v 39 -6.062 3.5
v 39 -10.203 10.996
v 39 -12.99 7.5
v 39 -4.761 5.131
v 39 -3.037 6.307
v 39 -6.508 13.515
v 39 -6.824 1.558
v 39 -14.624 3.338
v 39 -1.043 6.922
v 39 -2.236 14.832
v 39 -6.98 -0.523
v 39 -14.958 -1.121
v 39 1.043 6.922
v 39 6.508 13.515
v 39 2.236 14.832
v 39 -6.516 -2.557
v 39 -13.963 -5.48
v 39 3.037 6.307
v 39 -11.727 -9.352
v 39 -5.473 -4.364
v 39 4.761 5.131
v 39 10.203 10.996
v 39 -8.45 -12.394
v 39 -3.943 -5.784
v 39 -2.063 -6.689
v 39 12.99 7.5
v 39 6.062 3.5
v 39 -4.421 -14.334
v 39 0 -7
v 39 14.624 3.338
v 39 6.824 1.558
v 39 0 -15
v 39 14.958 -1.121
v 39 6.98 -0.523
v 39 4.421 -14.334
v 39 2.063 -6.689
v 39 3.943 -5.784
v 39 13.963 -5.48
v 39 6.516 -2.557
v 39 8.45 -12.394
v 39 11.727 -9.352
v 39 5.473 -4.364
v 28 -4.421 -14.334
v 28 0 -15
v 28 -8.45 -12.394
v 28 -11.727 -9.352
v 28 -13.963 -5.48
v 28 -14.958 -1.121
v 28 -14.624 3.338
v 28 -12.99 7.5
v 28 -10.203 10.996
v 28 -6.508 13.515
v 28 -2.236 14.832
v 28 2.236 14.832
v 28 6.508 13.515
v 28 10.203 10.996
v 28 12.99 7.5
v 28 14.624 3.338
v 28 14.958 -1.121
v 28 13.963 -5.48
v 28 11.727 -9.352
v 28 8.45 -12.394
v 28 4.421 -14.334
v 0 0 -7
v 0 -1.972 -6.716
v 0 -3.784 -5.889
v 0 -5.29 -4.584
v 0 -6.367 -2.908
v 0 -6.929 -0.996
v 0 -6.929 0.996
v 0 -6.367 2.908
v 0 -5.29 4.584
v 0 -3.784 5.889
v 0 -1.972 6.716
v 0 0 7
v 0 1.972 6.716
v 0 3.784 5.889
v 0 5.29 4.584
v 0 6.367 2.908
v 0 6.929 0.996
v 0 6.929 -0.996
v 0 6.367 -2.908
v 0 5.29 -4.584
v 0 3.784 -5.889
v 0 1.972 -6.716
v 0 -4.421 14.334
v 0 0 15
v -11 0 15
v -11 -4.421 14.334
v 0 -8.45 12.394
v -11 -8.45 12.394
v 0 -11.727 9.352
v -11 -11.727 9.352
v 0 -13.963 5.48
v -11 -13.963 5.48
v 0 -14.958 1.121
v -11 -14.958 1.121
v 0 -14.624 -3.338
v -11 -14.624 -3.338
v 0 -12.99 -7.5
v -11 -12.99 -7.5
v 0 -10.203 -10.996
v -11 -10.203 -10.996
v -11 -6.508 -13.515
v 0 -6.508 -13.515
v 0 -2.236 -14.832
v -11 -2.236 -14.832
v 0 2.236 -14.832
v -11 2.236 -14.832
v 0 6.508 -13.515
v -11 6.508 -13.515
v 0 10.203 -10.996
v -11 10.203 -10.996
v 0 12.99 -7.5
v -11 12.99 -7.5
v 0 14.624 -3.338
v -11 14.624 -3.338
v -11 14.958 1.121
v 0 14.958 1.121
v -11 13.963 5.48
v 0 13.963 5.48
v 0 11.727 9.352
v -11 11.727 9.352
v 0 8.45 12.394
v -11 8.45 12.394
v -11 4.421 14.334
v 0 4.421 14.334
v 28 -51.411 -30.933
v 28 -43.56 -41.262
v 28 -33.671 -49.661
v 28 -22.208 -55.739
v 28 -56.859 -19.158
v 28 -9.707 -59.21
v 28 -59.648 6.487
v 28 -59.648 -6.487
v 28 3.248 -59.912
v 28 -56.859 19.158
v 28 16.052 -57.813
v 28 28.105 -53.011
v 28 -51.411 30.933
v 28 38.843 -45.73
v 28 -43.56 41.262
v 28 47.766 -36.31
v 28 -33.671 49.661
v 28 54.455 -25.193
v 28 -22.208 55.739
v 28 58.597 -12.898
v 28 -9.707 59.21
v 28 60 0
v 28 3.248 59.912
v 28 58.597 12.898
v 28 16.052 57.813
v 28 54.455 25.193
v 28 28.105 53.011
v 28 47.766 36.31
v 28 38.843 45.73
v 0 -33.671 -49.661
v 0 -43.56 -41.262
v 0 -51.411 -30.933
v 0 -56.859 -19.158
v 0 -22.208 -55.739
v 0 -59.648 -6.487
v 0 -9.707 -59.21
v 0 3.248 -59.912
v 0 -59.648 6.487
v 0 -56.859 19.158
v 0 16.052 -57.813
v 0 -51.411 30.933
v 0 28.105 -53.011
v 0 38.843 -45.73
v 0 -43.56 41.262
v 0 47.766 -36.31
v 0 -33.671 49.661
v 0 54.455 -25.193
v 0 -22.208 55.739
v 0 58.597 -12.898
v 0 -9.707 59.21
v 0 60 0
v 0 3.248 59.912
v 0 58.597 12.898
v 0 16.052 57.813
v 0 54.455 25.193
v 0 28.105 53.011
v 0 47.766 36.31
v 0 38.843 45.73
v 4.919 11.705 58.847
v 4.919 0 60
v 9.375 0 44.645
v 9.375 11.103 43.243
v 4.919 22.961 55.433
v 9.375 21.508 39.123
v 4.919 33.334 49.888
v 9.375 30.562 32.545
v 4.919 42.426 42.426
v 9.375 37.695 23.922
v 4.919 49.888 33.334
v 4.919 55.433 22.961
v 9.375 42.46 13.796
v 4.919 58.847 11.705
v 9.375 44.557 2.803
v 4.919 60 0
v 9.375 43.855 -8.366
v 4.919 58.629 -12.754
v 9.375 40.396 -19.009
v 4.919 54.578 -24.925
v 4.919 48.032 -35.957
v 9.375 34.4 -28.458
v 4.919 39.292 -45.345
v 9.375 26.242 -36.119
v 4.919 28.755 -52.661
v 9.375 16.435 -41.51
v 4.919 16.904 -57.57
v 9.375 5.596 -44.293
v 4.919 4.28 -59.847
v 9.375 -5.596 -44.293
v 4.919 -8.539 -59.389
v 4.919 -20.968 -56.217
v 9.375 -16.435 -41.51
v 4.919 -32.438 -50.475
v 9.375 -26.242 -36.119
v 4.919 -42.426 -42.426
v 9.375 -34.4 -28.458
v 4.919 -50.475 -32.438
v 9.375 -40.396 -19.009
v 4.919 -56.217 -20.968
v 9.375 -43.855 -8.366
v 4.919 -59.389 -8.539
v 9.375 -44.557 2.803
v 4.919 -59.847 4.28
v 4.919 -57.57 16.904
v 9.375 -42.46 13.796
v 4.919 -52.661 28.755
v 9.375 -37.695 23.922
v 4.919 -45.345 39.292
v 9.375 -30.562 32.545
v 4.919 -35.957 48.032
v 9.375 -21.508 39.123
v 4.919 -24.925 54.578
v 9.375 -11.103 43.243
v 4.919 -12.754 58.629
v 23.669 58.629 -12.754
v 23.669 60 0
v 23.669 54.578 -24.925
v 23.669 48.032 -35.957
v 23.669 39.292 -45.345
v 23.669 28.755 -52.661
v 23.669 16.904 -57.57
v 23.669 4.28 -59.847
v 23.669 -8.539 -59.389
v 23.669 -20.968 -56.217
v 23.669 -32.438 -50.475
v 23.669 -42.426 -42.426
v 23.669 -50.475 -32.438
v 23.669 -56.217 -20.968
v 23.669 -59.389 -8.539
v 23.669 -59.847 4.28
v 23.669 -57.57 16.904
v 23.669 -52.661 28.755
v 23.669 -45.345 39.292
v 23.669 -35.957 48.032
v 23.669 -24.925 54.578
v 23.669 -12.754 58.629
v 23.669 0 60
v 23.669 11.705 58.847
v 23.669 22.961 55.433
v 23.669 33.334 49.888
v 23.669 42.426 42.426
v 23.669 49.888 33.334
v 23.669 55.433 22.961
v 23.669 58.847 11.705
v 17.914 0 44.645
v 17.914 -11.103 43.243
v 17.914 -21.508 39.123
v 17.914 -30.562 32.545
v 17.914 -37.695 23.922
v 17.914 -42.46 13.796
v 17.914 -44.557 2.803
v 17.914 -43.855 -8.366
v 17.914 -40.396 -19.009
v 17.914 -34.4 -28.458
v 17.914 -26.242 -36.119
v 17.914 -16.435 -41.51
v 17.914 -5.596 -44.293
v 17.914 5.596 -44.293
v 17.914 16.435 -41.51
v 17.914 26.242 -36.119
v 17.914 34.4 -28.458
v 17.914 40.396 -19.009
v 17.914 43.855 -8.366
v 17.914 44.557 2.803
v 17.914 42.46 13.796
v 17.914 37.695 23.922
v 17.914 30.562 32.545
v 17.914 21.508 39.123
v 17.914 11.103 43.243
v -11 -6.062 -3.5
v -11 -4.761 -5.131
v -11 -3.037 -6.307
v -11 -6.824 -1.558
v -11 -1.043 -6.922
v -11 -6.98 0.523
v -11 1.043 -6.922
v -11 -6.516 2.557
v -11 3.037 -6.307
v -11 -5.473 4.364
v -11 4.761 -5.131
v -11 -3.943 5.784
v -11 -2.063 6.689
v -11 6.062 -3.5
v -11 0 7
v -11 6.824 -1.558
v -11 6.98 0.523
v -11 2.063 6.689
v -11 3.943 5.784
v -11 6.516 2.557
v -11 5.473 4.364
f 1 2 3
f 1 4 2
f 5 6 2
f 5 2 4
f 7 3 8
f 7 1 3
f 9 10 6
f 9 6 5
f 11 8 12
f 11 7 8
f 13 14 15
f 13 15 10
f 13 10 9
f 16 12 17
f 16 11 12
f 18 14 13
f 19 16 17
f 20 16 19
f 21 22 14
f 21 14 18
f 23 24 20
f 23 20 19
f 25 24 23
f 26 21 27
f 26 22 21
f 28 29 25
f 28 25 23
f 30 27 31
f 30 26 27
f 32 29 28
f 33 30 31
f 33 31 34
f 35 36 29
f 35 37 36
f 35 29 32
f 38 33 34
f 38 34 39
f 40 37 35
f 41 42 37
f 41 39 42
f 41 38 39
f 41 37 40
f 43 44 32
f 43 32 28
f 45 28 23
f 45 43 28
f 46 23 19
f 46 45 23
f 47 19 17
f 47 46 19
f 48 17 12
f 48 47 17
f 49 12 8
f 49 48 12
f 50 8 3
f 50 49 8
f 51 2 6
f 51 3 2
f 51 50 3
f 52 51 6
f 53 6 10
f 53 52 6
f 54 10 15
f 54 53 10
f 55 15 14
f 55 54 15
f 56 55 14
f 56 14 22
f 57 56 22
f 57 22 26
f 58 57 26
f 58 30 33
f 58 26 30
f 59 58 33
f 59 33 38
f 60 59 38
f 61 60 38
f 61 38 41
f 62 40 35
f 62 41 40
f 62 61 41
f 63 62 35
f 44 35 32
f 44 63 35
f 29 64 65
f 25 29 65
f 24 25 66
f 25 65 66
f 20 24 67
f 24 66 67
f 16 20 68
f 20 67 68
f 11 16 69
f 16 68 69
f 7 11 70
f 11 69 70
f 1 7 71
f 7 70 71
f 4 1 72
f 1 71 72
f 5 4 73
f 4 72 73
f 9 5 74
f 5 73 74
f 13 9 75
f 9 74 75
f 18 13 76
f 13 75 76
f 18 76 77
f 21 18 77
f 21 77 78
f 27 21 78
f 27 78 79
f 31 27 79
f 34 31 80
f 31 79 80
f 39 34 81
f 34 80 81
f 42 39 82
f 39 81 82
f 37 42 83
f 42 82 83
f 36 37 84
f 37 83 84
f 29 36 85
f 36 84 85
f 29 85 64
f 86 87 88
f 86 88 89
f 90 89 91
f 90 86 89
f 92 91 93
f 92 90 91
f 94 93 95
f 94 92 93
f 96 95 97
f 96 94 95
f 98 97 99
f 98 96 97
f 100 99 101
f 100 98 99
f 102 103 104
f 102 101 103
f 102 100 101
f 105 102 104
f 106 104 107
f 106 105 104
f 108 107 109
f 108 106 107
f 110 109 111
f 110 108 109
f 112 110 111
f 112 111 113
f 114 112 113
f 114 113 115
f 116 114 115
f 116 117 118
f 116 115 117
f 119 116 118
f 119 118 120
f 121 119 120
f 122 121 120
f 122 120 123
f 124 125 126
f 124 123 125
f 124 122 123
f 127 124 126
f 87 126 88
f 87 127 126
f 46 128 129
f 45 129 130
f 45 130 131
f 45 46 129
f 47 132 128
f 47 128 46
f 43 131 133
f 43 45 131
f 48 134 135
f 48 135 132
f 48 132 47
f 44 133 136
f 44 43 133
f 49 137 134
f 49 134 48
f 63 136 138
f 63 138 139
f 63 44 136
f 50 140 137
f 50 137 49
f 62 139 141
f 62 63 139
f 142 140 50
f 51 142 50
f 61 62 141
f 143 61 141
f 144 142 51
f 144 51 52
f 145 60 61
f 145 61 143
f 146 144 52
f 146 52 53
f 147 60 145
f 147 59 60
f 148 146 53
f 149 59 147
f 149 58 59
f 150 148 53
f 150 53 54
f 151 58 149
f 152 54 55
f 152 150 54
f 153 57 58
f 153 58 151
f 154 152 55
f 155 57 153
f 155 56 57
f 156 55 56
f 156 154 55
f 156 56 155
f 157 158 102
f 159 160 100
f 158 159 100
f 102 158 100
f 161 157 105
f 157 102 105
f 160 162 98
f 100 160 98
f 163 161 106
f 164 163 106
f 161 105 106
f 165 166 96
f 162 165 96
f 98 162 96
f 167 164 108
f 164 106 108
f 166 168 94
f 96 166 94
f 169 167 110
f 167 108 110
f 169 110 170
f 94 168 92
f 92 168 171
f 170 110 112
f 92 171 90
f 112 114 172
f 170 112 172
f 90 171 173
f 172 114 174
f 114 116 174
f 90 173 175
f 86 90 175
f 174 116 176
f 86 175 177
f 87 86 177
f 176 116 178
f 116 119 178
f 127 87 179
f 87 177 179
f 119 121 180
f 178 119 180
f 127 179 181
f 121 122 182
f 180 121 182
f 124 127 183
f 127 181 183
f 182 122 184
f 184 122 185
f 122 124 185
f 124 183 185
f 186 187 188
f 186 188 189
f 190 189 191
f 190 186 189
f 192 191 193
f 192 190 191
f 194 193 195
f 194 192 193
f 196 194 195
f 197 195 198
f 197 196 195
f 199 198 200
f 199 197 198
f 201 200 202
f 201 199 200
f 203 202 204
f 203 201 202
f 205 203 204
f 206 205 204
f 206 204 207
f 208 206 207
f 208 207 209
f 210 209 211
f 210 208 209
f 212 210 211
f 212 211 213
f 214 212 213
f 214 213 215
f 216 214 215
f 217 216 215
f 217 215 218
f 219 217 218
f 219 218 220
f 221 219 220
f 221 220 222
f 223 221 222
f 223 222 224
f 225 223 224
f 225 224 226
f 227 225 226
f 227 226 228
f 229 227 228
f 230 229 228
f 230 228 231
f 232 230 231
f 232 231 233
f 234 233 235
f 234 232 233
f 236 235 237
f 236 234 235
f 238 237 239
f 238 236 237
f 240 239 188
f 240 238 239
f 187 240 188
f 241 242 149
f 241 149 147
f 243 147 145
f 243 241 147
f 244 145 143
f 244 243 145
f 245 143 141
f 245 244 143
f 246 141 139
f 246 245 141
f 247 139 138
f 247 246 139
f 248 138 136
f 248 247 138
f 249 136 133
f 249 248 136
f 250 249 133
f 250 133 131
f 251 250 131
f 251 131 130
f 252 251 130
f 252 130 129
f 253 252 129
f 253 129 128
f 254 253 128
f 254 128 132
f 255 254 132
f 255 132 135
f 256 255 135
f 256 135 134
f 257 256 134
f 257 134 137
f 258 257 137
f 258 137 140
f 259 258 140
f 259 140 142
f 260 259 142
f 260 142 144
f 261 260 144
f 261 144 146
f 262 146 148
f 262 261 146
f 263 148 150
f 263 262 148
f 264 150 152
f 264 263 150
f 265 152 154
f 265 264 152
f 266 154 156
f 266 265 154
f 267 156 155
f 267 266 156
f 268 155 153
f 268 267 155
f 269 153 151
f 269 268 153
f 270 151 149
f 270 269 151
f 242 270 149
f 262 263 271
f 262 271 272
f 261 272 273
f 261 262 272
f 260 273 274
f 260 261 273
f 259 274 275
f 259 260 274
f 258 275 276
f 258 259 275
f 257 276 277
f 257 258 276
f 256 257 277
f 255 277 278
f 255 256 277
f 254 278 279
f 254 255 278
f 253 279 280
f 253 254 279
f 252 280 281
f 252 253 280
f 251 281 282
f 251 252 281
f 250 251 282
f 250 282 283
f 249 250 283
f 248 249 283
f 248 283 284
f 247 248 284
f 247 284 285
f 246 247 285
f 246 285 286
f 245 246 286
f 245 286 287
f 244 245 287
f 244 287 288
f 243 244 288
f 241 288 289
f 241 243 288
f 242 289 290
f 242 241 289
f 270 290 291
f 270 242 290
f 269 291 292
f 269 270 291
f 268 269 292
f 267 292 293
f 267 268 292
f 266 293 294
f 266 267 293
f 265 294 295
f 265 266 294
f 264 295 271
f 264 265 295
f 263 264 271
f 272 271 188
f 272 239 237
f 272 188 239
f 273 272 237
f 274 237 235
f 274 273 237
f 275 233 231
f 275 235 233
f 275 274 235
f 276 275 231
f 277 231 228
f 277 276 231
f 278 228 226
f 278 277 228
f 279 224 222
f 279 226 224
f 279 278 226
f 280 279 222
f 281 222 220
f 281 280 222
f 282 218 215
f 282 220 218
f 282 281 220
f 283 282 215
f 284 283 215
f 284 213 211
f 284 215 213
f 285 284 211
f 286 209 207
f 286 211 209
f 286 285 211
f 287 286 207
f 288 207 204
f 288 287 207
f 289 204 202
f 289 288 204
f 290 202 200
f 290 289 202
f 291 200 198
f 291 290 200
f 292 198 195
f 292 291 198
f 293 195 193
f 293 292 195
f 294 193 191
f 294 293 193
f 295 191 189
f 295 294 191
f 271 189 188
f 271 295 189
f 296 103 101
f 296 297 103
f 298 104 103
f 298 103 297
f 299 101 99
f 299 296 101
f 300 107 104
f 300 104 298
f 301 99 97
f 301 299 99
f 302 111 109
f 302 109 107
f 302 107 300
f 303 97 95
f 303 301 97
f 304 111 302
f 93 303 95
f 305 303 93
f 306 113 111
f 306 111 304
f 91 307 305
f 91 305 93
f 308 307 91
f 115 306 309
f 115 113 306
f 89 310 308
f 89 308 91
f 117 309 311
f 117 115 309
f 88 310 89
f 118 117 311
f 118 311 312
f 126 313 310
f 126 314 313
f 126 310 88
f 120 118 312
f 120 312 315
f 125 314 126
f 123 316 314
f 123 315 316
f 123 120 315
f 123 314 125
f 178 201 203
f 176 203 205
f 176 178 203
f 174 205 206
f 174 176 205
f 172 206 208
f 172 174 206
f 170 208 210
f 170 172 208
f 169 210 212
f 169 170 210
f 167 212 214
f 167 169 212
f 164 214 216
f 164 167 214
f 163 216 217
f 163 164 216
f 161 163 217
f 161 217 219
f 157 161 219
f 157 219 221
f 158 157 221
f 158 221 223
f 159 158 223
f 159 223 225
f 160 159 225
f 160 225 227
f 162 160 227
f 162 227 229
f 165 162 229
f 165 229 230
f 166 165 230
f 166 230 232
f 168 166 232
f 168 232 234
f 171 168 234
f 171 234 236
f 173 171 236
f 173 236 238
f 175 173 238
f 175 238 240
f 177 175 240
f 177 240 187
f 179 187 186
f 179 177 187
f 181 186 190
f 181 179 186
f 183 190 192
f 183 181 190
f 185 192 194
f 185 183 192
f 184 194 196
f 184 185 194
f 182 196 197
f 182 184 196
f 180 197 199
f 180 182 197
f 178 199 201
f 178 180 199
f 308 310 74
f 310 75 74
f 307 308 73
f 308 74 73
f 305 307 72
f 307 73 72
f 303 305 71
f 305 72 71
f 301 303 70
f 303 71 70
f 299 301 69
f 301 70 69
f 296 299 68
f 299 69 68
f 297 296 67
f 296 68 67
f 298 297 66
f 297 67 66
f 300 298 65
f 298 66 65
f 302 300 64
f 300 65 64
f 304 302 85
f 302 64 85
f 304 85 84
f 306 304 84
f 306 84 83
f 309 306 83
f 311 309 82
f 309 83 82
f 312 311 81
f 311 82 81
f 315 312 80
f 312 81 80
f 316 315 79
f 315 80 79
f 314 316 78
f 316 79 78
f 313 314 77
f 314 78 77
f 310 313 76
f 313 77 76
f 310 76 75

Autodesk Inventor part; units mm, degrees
ref_plane "YZ Plane" through (0, 0, 0) normal (1, 0, 0) x (0, 1, 0)
ref_plane "XZ Plane" through (0, 0, 0) normal (0, 1, 0) x (-1, 0, 0)
ref_plane "XY Plane" through (0, 0, 0) normal (0, 0, 1) x (1, 0, 0)
sketch "Sketch1" plane through (0, 0, 0) normal (1, 0, 0) x (0, 1, 0)
  circle A0 centre (0, 0) radius 60
  dimension "d0" = 120
extrude "Extrusion1" add sketch "Sketch1" along normal blind 28
sketch "Sketch2" plane through (28, 0, 0) normal (1, 0, 0) x (0, 0, -1)
  circle A0 centre (0, 0) radius 7
  dimension "d3" = 14
extrude "Extrusion2" cut sketch "Sketch2" against normal blind 28
sketch "Sketch3" plane through (0, 0, 0) normal (0, 1, 0) x (-1, 0, 0)
  line L0 (0, 60) -> (-28, 60) projected
  line L1 (-4.9193, 60) -> (-9.3746, 44.6454)
  line L2 (-9.3746, 44.6454) -> (-17.9139, 44.6454)
  line L3 (-17.9139, 44.6454) -> (-23.6686, 60)
  line L4 (-4.9193, 60) -> (-23.6686, 60)
  line L5 (-62.3987, 0) -> (62.1852, 0)
  point P0 (0, 0)
revolve "Revolution1" cut sketch "Sketch3" angle 360 about axis through (62.3987, 0, 0) along (-1, 0, 0)
sketch "Sketch4" plane through (28, 0, 0) normal (1, 0, 0) x (0, 0, -1)
  circle A0 centre (0, 0) radius 15
  circle A1 centre (0, 0) radius 7
  dimension "d7" = 30
  dimension "d8" = 14
extrude "Extrusion3" add sketch "Sketch4" along normal blind 11
sketch "Sketch5" plane through (0, 0, 0) normal (-1, 0, 0) x (0, 0, 1)
  circle A0 centre (0, 0) radius 7
  circle A1 centre (0, 0) radius 15
  dimension "d11" = 30
  dimension "d12" = 14
extrude "Extrusion4" add sketch "Sketch5" along normal blind 11
properties part number "Rueda"
